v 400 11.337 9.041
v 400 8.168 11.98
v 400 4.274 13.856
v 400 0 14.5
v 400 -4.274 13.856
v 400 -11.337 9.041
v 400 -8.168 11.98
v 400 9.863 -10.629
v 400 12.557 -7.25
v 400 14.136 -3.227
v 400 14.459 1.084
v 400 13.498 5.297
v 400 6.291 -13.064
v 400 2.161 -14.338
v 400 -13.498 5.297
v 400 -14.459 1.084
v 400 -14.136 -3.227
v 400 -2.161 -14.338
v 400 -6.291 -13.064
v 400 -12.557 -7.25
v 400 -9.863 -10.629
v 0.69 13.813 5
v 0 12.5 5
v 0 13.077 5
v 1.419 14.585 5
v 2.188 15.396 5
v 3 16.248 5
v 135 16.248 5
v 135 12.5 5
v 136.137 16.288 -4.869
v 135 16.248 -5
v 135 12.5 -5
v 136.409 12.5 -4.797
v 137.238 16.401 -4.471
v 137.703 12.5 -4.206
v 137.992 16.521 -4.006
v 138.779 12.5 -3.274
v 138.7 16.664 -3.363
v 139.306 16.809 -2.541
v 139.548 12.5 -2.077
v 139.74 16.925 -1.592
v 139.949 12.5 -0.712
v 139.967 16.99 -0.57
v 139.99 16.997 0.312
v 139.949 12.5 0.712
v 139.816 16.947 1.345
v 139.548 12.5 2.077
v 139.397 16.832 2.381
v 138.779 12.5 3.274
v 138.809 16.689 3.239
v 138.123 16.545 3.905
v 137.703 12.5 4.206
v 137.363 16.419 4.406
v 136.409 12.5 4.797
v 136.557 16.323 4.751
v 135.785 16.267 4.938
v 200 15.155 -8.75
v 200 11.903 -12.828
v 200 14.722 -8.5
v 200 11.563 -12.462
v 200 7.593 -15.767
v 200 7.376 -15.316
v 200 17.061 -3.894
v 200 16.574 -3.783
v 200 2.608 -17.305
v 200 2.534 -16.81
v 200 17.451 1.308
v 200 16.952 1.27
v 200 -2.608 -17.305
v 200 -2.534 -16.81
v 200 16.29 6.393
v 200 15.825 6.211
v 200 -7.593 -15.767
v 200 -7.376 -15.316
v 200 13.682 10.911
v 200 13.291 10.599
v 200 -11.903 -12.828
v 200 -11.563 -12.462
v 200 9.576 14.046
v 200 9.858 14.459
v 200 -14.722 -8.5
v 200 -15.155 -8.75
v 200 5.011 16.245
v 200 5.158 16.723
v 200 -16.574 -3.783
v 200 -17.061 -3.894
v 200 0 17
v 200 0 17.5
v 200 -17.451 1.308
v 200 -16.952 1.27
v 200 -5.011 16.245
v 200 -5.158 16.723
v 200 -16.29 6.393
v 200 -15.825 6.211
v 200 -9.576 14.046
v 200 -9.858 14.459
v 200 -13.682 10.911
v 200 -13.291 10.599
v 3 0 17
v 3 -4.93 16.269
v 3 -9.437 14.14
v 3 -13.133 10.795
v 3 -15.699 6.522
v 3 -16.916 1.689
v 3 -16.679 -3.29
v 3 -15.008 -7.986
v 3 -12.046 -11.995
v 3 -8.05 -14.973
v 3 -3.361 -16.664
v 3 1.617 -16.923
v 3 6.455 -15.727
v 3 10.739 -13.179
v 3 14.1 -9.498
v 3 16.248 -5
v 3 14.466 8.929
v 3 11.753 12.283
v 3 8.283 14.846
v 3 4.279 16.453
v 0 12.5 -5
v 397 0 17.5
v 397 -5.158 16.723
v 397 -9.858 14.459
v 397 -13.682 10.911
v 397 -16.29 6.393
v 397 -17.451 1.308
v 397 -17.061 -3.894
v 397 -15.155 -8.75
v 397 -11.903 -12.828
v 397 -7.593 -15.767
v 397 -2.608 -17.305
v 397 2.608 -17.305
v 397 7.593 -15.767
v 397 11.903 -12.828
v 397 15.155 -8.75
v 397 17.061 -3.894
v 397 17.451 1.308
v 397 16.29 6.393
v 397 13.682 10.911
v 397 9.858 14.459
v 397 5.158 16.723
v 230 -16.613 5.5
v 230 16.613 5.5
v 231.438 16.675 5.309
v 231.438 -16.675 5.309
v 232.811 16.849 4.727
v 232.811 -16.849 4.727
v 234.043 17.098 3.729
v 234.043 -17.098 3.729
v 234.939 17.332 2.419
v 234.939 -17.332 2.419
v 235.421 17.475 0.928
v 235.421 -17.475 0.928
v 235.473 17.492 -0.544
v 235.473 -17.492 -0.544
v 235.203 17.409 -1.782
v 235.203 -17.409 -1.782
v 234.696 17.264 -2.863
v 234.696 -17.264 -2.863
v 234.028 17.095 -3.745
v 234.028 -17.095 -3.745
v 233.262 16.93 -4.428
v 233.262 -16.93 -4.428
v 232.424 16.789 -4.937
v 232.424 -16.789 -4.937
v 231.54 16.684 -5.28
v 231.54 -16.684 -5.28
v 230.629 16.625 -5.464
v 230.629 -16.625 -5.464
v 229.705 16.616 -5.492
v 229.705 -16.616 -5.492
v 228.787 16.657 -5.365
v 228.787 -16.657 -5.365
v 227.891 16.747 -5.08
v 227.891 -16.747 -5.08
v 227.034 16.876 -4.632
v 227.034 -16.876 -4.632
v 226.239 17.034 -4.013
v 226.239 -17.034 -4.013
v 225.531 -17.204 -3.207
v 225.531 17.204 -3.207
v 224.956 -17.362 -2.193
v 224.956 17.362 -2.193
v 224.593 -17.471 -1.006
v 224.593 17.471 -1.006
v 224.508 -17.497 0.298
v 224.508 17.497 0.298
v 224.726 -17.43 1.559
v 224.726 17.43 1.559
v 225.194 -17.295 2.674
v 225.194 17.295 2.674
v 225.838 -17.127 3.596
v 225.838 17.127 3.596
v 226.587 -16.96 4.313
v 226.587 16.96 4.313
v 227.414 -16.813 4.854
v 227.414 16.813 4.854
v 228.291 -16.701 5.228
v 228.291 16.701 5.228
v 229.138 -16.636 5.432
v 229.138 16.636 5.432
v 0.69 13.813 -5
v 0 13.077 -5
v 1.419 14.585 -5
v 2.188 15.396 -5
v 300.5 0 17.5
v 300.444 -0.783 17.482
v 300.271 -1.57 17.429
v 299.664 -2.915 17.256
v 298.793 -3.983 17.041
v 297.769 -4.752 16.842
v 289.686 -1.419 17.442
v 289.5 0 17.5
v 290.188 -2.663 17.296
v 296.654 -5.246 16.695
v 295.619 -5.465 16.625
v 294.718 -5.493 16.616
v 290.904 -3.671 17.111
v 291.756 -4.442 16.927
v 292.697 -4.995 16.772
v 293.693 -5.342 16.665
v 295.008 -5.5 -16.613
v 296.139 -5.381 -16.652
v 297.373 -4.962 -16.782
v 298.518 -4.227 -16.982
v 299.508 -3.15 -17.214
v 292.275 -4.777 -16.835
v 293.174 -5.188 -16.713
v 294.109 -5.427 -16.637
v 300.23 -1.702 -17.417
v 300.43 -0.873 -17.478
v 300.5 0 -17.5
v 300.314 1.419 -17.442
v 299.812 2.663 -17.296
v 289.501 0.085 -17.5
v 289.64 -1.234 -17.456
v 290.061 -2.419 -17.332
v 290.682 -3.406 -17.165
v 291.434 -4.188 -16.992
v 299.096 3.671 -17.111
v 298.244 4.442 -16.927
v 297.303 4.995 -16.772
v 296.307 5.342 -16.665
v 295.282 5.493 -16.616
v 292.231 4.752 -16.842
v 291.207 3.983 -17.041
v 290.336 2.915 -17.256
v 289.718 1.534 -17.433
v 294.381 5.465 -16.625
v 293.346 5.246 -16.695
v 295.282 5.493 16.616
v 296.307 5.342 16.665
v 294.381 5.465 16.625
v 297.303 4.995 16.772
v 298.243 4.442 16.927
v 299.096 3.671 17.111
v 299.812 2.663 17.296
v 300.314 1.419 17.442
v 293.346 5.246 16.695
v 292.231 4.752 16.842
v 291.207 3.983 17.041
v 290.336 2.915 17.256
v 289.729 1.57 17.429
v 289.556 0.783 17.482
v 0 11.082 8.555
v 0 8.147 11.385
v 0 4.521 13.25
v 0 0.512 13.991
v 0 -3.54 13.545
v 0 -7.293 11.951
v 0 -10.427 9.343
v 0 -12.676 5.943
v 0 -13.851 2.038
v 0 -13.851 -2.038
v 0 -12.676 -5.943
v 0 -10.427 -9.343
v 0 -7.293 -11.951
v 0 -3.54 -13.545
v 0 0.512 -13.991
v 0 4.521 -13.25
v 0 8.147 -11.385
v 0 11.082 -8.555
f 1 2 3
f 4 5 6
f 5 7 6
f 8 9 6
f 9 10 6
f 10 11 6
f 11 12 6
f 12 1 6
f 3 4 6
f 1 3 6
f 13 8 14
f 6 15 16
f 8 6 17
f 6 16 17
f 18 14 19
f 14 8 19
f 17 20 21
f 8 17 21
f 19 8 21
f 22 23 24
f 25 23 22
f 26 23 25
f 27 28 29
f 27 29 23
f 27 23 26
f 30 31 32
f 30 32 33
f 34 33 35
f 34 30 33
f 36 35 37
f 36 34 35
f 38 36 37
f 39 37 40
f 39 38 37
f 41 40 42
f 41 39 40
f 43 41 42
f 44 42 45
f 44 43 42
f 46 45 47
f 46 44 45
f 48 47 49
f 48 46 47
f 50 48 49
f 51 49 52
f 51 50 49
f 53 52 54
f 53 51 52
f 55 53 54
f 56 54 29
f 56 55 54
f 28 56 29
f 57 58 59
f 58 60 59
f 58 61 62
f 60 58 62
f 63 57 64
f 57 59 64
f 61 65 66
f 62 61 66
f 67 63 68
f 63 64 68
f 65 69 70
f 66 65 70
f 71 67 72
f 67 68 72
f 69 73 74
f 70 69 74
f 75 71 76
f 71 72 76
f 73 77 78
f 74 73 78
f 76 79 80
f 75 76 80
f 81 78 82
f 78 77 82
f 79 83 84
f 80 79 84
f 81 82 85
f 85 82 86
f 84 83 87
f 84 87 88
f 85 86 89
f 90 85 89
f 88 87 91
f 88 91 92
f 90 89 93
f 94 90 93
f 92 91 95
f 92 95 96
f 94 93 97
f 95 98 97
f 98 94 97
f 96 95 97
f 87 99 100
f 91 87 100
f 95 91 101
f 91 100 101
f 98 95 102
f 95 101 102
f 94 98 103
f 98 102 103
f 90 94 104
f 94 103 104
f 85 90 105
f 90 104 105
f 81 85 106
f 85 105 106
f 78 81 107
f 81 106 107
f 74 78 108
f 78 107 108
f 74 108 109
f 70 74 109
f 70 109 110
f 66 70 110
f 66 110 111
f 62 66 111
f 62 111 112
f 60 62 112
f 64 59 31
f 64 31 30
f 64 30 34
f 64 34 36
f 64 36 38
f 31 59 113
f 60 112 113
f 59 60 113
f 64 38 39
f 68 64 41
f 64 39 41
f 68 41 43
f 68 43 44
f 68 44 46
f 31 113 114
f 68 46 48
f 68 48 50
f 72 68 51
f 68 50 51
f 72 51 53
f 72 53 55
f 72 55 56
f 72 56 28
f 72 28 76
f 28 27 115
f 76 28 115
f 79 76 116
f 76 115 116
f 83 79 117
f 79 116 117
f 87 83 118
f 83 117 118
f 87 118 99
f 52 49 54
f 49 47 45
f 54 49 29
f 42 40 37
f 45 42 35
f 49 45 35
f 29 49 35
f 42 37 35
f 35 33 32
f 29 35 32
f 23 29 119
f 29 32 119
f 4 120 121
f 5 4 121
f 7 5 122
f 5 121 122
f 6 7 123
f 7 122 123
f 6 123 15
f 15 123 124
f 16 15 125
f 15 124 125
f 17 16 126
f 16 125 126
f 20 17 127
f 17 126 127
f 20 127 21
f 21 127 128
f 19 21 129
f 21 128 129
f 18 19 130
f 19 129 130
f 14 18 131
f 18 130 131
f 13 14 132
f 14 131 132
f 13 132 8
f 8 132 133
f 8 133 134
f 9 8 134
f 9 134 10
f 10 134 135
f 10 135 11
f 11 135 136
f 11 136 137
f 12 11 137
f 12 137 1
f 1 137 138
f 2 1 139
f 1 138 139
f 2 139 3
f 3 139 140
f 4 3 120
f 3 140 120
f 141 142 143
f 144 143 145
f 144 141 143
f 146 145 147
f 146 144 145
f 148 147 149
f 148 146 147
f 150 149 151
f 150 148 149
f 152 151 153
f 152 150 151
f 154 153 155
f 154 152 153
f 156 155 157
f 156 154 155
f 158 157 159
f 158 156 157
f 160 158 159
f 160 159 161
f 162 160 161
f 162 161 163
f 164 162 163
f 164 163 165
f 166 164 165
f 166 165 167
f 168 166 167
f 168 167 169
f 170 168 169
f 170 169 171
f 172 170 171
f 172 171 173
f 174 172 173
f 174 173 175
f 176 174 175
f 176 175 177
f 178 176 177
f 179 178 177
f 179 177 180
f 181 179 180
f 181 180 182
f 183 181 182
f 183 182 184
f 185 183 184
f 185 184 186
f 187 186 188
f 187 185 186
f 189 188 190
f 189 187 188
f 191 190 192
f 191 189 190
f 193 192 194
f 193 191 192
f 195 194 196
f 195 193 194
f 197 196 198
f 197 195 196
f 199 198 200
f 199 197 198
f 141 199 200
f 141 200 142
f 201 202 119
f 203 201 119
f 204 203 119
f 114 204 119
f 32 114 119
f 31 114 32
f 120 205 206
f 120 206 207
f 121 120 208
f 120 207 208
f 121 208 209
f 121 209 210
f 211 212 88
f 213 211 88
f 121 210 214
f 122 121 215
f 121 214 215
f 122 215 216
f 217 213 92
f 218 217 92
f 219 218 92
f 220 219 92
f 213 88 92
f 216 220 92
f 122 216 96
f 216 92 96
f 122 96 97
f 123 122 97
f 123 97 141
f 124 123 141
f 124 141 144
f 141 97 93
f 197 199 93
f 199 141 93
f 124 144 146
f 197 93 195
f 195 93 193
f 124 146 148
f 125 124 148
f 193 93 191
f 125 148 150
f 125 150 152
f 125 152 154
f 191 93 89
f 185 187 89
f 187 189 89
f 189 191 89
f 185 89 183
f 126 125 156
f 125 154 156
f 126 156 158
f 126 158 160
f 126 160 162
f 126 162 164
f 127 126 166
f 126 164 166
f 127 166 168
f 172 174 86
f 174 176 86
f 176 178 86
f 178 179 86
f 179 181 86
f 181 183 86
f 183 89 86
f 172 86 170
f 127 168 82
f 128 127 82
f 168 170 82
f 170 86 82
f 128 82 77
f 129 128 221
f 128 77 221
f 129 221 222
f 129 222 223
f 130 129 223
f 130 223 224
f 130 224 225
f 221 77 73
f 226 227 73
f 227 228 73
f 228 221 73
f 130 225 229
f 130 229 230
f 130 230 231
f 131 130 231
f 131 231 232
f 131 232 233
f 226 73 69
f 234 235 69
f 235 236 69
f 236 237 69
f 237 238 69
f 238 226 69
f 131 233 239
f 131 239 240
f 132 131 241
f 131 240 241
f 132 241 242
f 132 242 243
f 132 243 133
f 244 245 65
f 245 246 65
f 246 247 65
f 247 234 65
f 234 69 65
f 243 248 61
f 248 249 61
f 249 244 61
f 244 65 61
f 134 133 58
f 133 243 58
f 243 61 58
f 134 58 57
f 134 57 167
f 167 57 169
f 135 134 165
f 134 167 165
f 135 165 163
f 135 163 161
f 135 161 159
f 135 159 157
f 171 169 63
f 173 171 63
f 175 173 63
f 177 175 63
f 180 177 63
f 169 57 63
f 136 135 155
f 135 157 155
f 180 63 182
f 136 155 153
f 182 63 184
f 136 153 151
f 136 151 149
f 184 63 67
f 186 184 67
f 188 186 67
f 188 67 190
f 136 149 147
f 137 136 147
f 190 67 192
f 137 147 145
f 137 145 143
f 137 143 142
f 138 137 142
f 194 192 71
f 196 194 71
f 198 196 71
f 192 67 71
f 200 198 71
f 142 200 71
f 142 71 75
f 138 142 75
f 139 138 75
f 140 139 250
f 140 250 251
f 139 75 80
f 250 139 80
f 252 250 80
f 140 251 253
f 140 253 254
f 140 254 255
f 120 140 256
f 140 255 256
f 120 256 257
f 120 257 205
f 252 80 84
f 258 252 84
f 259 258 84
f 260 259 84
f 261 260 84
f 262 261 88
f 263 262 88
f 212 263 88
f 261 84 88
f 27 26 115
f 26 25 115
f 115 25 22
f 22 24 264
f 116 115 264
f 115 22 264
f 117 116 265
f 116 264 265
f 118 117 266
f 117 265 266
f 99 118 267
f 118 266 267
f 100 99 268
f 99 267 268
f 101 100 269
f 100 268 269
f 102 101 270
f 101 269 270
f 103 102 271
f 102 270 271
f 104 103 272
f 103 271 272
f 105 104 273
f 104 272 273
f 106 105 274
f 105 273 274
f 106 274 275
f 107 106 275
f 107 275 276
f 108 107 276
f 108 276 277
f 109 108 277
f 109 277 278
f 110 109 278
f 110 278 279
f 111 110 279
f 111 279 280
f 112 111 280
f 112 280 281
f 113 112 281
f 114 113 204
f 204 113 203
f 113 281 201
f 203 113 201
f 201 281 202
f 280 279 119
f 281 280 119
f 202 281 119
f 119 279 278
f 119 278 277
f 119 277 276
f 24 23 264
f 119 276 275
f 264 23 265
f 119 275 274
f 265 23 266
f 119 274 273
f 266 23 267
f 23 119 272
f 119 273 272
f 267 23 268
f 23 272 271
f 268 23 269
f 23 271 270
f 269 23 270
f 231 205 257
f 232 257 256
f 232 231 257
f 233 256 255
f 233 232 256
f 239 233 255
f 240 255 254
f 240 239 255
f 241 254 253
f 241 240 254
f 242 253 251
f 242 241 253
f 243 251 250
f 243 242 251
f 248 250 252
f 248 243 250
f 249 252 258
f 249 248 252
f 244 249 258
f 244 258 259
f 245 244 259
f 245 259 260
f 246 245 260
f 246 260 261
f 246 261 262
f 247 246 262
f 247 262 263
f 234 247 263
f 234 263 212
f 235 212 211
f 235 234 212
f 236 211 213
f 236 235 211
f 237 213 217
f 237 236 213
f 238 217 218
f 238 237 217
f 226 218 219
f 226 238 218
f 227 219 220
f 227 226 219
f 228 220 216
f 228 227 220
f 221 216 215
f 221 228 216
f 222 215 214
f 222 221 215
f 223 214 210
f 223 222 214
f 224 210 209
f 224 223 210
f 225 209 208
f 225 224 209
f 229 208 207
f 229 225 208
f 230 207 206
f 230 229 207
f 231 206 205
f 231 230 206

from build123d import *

# Parameters (mm, degrees)
CHAMFER1_SIZE           = 3
CUT_EXTRUDE1_START      = 17
CUT_EXTRUDE1_DEPTH      = 4.5
CUT_EXTRUDE2_DEPTH      = 401.764893672
CUT_EXTRUDE2_DEPTH_BACK = 401.764893672
SKETCH3_R               = 5.5
CUT_EXTRUDE3_DEPTH      = 401.764893681
CUT_EXTRUDE3_DEPTH_BACK = 401.764893681
SKETCH4_R               = 5.5


with BuildPart() as part:
    # Sketch1 → Revolve1 (revolve)
    with BuildSketch(Plane.XY, mode=Mode.PRIVATE) as revolve1_sk:
        Polygon((0, 0), (400, 0), (400, 17.5), (200, 17.5), (200, 17), (0, 17), align=None)
    revolve(revolve1_sk.sketch.rotate(Axis((0, 0, 0), (1, 0, 0)), 90), axis=Axis((0, 0, 0), (1, 0, 0)))

    # Chamfer1
    chamfer1_edges = [part.edges().sort_by_distance(p)[0] for p in [
        (0, 0, -17),
        (400, 0, -17.5),
    ]]
    chamfer(chamfer1_edges, length=CHAMFER1_SIZE)

    # Sketch2 → Cut-Extrude1 (cut)
    with BuildSketch(Plane(origin=(0, 0, 0), x_dir=(1, 0, 0), z_dir=(0, 1, 0)).offset(CUT_EXTRUDE1_START)):
        with BuildLine():
            Line((0, 5), (135, 5))
            ThreePointArc((135, 5), (140, 0), (135, -5))
            Line((135, -5), (0, -5))
            Line((0, -5), (0, 5))
        make_face()
    extrude(amount=-CUT_EXTRUDE1_DEPTH, mode=Mode.SUBTRACT)

    # Sketch3 → Cut-Extrude2 (cut, two sides: drawn at the far end of the back side and taken through both)
    with BuildSketch(Plane(origin=(0, 0, 0), x_dir=(1, 0, 0), z_dir=(0, 1, 0)).offset(-CUT_EXTRUDE2_DEPTH_BACK)):
        with Locations(Location((230, 0, 0), (0, 0, 270))):
            Circle(SKETCH3_R)
    extrude(amount=CUT_EXTRUDE2_DEPTH + CUT_EXTRUDE2_DEPTH_BACK, mode=Mode.SUBTRACT)

    # Sketch4 → Cut-Extrude3 (cut, two sides: drawn at the far end of the back side and taken through both)
    with BuildSketch(Plane.XY.offset(-CUT_EXTRUDE3_DEPTH_BACK)):
        with Locations((295, 0)):
            Circle(SKETCH4_R)
    extrude(amount=CUT_EXTRUDE3_DEPTH + CUT_EXTRUDE3_DEPTH_BACK, mode=Mode.SUBTRACT)


solid = part.part
